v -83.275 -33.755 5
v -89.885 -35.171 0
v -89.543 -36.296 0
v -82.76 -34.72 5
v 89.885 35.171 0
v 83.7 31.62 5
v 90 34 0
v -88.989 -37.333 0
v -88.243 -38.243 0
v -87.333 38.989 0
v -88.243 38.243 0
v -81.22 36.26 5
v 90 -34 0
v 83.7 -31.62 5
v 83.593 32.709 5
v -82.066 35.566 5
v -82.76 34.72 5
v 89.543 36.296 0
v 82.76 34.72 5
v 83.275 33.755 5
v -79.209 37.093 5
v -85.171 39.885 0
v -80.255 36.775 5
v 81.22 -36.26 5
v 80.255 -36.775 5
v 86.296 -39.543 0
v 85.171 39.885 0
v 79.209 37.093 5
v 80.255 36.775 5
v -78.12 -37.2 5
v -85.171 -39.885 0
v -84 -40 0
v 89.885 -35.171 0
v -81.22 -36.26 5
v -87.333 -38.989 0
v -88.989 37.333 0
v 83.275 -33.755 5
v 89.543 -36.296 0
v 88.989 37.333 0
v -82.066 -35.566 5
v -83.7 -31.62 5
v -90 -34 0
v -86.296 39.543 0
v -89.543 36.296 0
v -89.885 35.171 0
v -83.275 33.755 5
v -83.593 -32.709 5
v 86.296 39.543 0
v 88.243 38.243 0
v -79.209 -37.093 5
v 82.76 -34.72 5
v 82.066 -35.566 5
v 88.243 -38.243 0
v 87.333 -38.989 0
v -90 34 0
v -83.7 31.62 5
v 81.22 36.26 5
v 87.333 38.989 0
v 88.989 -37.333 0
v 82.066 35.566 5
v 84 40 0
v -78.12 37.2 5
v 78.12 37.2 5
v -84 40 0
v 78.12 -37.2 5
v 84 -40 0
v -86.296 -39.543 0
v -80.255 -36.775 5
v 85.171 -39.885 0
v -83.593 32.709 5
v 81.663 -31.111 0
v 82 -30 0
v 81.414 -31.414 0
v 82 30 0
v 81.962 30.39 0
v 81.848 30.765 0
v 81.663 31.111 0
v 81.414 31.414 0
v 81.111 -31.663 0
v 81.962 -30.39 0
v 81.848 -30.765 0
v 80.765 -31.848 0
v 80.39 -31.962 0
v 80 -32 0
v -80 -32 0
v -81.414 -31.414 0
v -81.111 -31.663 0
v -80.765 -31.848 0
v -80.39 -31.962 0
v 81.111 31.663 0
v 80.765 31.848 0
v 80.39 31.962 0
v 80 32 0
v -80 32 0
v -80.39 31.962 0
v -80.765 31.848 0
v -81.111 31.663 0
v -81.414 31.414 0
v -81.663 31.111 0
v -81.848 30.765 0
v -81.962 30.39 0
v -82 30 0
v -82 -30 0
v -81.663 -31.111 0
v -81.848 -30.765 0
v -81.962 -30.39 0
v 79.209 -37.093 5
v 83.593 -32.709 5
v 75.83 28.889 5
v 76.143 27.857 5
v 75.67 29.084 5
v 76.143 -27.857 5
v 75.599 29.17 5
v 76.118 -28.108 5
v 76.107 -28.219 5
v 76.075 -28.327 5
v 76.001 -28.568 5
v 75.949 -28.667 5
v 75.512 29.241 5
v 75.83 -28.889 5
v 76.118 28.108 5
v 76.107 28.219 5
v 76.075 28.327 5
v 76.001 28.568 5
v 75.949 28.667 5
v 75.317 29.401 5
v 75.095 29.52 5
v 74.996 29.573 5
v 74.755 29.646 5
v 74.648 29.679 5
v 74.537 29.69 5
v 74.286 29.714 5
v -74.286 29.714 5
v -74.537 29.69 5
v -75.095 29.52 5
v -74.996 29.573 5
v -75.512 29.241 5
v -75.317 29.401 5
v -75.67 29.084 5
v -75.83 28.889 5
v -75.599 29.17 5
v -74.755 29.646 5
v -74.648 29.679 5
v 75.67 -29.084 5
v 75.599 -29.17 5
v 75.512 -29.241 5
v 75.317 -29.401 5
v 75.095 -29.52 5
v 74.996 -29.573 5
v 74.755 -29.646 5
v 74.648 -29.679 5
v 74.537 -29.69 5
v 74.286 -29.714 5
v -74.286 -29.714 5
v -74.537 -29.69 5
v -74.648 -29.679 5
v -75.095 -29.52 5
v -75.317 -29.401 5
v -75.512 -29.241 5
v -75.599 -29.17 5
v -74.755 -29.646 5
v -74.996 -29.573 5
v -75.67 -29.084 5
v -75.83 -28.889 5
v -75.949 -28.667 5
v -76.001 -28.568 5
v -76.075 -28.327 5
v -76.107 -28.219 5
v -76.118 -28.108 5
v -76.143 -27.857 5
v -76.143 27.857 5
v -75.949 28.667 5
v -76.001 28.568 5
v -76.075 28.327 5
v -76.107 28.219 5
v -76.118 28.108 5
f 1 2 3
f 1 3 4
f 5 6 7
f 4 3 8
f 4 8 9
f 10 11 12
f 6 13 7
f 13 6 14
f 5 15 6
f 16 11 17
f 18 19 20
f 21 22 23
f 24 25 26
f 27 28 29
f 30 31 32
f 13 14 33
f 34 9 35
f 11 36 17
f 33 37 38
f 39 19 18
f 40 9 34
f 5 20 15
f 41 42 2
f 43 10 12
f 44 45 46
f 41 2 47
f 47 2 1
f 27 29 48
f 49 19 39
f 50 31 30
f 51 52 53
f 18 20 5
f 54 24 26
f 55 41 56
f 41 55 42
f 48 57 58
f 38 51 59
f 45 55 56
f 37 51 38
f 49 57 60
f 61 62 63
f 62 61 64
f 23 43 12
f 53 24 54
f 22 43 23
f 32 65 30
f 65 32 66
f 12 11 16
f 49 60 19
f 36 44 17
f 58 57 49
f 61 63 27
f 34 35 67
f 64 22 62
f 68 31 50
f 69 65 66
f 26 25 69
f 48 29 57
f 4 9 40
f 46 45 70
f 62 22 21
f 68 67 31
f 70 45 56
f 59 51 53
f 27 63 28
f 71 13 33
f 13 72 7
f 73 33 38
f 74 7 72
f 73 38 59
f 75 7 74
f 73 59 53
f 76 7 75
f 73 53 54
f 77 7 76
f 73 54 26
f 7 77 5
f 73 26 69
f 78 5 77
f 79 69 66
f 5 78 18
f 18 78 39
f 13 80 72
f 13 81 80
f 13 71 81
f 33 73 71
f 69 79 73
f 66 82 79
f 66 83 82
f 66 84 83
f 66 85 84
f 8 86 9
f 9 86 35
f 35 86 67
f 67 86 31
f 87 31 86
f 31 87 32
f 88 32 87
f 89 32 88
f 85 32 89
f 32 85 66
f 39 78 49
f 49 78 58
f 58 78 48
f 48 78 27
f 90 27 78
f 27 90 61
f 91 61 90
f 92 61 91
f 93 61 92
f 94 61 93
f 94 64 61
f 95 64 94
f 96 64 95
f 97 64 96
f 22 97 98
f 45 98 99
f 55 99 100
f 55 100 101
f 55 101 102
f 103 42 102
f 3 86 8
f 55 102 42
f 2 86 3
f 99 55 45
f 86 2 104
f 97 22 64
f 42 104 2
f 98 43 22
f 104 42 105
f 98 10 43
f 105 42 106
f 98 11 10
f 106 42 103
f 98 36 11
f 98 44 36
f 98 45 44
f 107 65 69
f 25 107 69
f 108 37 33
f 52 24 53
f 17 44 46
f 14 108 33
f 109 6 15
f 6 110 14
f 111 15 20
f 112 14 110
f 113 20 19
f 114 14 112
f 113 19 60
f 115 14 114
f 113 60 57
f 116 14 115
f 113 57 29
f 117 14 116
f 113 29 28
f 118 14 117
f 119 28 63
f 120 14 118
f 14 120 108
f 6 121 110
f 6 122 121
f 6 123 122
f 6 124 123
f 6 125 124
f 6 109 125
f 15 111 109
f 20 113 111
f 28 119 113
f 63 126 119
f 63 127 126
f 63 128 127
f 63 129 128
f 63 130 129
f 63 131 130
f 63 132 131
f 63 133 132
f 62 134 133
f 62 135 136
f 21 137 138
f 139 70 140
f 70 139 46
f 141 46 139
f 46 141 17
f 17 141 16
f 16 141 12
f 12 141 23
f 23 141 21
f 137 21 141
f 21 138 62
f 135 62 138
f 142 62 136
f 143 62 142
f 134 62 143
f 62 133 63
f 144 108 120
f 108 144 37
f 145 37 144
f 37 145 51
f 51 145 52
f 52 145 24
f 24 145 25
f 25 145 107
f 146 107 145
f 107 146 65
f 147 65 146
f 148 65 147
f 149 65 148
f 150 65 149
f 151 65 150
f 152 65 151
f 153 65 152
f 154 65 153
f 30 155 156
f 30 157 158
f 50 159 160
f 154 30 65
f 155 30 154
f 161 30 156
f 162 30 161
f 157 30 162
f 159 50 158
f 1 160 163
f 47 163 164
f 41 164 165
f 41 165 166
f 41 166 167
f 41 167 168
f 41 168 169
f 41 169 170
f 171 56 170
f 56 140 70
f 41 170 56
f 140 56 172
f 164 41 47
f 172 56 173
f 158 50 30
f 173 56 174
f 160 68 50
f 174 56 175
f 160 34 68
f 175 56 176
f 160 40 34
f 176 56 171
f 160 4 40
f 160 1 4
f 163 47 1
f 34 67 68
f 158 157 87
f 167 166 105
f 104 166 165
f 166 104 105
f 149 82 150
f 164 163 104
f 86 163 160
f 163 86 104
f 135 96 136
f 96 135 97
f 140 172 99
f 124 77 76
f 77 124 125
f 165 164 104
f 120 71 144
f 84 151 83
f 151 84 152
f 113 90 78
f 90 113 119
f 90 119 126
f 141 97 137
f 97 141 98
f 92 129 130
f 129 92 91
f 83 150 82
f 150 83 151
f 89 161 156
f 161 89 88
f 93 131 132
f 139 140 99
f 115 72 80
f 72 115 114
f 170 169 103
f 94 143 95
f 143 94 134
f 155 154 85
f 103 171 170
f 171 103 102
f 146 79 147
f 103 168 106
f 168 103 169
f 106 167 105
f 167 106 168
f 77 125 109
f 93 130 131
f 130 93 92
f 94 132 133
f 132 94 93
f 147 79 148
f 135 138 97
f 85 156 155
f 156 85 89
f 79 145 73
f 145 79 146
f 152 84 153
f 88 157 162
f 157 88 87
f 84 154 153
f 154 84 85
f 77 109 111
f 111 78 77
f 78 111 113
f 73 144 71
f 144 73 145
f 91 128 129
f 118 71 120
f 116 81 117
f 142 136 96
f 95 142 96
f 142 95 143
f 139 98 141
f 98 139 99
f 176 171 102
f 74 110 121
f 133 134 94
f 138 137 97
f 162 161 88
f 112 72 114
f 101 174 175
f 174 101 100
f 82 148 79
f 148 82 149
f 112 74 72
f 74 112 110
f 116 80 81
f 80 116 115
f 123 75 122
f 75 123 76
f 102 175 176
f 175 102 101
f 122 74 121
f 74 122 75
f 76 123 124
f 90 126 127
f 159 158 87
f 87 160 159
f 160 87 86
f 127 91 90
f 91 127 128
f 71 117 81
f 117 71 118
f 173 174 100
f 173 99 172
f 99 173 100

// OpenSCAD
$fn = 32;

// ----------------------------------------------------------------------
// Display bezel: 180 x 80 mm frame, opening 164x64 mm
// ----------------------------------------------------------------------

// --- parameters (mm) ---
length = 180;             // frame outside length, X
width = 80;               // frame outside width, Y
frame_w = 8;              // frame width
thickness = 5;            // frame thickness
corner_r = 6;             // outside corner radius
chamfer = 0.93;           // outer wall taper
funnel = 0.9;             // inner opening taper
opening_l = 164;          // opening length
opening_w = 64;           // opening width
inner_r = 2;              // opening corner radius

/* rounded-rectangle outlines, generated with loops */
module rounded_ring(l_nom, w_nom, r) {
  hull() {
    for (sx = [-1, 1]) for (sy = [-1, 1])
      translate([sx * (l_nom / 2 - r), sy * (w_nom / 2 - r)]) circle(r = r);
  }
}

difference() {
  /* frame body, drafted so the outer edge is a variable-depth chamfer */
  linear_extrude(height = thickness, scale = chamfer)
    rounded_ring(length, width, corner_r);
  /* viewing opening, drafted the other way for a funnel edge */
  linear_extrude(height = thickness + 2, scale = funnel)
    translate([0, 0, -1]) rounded_ring(opening_l, opening_w, inner_r);
}
